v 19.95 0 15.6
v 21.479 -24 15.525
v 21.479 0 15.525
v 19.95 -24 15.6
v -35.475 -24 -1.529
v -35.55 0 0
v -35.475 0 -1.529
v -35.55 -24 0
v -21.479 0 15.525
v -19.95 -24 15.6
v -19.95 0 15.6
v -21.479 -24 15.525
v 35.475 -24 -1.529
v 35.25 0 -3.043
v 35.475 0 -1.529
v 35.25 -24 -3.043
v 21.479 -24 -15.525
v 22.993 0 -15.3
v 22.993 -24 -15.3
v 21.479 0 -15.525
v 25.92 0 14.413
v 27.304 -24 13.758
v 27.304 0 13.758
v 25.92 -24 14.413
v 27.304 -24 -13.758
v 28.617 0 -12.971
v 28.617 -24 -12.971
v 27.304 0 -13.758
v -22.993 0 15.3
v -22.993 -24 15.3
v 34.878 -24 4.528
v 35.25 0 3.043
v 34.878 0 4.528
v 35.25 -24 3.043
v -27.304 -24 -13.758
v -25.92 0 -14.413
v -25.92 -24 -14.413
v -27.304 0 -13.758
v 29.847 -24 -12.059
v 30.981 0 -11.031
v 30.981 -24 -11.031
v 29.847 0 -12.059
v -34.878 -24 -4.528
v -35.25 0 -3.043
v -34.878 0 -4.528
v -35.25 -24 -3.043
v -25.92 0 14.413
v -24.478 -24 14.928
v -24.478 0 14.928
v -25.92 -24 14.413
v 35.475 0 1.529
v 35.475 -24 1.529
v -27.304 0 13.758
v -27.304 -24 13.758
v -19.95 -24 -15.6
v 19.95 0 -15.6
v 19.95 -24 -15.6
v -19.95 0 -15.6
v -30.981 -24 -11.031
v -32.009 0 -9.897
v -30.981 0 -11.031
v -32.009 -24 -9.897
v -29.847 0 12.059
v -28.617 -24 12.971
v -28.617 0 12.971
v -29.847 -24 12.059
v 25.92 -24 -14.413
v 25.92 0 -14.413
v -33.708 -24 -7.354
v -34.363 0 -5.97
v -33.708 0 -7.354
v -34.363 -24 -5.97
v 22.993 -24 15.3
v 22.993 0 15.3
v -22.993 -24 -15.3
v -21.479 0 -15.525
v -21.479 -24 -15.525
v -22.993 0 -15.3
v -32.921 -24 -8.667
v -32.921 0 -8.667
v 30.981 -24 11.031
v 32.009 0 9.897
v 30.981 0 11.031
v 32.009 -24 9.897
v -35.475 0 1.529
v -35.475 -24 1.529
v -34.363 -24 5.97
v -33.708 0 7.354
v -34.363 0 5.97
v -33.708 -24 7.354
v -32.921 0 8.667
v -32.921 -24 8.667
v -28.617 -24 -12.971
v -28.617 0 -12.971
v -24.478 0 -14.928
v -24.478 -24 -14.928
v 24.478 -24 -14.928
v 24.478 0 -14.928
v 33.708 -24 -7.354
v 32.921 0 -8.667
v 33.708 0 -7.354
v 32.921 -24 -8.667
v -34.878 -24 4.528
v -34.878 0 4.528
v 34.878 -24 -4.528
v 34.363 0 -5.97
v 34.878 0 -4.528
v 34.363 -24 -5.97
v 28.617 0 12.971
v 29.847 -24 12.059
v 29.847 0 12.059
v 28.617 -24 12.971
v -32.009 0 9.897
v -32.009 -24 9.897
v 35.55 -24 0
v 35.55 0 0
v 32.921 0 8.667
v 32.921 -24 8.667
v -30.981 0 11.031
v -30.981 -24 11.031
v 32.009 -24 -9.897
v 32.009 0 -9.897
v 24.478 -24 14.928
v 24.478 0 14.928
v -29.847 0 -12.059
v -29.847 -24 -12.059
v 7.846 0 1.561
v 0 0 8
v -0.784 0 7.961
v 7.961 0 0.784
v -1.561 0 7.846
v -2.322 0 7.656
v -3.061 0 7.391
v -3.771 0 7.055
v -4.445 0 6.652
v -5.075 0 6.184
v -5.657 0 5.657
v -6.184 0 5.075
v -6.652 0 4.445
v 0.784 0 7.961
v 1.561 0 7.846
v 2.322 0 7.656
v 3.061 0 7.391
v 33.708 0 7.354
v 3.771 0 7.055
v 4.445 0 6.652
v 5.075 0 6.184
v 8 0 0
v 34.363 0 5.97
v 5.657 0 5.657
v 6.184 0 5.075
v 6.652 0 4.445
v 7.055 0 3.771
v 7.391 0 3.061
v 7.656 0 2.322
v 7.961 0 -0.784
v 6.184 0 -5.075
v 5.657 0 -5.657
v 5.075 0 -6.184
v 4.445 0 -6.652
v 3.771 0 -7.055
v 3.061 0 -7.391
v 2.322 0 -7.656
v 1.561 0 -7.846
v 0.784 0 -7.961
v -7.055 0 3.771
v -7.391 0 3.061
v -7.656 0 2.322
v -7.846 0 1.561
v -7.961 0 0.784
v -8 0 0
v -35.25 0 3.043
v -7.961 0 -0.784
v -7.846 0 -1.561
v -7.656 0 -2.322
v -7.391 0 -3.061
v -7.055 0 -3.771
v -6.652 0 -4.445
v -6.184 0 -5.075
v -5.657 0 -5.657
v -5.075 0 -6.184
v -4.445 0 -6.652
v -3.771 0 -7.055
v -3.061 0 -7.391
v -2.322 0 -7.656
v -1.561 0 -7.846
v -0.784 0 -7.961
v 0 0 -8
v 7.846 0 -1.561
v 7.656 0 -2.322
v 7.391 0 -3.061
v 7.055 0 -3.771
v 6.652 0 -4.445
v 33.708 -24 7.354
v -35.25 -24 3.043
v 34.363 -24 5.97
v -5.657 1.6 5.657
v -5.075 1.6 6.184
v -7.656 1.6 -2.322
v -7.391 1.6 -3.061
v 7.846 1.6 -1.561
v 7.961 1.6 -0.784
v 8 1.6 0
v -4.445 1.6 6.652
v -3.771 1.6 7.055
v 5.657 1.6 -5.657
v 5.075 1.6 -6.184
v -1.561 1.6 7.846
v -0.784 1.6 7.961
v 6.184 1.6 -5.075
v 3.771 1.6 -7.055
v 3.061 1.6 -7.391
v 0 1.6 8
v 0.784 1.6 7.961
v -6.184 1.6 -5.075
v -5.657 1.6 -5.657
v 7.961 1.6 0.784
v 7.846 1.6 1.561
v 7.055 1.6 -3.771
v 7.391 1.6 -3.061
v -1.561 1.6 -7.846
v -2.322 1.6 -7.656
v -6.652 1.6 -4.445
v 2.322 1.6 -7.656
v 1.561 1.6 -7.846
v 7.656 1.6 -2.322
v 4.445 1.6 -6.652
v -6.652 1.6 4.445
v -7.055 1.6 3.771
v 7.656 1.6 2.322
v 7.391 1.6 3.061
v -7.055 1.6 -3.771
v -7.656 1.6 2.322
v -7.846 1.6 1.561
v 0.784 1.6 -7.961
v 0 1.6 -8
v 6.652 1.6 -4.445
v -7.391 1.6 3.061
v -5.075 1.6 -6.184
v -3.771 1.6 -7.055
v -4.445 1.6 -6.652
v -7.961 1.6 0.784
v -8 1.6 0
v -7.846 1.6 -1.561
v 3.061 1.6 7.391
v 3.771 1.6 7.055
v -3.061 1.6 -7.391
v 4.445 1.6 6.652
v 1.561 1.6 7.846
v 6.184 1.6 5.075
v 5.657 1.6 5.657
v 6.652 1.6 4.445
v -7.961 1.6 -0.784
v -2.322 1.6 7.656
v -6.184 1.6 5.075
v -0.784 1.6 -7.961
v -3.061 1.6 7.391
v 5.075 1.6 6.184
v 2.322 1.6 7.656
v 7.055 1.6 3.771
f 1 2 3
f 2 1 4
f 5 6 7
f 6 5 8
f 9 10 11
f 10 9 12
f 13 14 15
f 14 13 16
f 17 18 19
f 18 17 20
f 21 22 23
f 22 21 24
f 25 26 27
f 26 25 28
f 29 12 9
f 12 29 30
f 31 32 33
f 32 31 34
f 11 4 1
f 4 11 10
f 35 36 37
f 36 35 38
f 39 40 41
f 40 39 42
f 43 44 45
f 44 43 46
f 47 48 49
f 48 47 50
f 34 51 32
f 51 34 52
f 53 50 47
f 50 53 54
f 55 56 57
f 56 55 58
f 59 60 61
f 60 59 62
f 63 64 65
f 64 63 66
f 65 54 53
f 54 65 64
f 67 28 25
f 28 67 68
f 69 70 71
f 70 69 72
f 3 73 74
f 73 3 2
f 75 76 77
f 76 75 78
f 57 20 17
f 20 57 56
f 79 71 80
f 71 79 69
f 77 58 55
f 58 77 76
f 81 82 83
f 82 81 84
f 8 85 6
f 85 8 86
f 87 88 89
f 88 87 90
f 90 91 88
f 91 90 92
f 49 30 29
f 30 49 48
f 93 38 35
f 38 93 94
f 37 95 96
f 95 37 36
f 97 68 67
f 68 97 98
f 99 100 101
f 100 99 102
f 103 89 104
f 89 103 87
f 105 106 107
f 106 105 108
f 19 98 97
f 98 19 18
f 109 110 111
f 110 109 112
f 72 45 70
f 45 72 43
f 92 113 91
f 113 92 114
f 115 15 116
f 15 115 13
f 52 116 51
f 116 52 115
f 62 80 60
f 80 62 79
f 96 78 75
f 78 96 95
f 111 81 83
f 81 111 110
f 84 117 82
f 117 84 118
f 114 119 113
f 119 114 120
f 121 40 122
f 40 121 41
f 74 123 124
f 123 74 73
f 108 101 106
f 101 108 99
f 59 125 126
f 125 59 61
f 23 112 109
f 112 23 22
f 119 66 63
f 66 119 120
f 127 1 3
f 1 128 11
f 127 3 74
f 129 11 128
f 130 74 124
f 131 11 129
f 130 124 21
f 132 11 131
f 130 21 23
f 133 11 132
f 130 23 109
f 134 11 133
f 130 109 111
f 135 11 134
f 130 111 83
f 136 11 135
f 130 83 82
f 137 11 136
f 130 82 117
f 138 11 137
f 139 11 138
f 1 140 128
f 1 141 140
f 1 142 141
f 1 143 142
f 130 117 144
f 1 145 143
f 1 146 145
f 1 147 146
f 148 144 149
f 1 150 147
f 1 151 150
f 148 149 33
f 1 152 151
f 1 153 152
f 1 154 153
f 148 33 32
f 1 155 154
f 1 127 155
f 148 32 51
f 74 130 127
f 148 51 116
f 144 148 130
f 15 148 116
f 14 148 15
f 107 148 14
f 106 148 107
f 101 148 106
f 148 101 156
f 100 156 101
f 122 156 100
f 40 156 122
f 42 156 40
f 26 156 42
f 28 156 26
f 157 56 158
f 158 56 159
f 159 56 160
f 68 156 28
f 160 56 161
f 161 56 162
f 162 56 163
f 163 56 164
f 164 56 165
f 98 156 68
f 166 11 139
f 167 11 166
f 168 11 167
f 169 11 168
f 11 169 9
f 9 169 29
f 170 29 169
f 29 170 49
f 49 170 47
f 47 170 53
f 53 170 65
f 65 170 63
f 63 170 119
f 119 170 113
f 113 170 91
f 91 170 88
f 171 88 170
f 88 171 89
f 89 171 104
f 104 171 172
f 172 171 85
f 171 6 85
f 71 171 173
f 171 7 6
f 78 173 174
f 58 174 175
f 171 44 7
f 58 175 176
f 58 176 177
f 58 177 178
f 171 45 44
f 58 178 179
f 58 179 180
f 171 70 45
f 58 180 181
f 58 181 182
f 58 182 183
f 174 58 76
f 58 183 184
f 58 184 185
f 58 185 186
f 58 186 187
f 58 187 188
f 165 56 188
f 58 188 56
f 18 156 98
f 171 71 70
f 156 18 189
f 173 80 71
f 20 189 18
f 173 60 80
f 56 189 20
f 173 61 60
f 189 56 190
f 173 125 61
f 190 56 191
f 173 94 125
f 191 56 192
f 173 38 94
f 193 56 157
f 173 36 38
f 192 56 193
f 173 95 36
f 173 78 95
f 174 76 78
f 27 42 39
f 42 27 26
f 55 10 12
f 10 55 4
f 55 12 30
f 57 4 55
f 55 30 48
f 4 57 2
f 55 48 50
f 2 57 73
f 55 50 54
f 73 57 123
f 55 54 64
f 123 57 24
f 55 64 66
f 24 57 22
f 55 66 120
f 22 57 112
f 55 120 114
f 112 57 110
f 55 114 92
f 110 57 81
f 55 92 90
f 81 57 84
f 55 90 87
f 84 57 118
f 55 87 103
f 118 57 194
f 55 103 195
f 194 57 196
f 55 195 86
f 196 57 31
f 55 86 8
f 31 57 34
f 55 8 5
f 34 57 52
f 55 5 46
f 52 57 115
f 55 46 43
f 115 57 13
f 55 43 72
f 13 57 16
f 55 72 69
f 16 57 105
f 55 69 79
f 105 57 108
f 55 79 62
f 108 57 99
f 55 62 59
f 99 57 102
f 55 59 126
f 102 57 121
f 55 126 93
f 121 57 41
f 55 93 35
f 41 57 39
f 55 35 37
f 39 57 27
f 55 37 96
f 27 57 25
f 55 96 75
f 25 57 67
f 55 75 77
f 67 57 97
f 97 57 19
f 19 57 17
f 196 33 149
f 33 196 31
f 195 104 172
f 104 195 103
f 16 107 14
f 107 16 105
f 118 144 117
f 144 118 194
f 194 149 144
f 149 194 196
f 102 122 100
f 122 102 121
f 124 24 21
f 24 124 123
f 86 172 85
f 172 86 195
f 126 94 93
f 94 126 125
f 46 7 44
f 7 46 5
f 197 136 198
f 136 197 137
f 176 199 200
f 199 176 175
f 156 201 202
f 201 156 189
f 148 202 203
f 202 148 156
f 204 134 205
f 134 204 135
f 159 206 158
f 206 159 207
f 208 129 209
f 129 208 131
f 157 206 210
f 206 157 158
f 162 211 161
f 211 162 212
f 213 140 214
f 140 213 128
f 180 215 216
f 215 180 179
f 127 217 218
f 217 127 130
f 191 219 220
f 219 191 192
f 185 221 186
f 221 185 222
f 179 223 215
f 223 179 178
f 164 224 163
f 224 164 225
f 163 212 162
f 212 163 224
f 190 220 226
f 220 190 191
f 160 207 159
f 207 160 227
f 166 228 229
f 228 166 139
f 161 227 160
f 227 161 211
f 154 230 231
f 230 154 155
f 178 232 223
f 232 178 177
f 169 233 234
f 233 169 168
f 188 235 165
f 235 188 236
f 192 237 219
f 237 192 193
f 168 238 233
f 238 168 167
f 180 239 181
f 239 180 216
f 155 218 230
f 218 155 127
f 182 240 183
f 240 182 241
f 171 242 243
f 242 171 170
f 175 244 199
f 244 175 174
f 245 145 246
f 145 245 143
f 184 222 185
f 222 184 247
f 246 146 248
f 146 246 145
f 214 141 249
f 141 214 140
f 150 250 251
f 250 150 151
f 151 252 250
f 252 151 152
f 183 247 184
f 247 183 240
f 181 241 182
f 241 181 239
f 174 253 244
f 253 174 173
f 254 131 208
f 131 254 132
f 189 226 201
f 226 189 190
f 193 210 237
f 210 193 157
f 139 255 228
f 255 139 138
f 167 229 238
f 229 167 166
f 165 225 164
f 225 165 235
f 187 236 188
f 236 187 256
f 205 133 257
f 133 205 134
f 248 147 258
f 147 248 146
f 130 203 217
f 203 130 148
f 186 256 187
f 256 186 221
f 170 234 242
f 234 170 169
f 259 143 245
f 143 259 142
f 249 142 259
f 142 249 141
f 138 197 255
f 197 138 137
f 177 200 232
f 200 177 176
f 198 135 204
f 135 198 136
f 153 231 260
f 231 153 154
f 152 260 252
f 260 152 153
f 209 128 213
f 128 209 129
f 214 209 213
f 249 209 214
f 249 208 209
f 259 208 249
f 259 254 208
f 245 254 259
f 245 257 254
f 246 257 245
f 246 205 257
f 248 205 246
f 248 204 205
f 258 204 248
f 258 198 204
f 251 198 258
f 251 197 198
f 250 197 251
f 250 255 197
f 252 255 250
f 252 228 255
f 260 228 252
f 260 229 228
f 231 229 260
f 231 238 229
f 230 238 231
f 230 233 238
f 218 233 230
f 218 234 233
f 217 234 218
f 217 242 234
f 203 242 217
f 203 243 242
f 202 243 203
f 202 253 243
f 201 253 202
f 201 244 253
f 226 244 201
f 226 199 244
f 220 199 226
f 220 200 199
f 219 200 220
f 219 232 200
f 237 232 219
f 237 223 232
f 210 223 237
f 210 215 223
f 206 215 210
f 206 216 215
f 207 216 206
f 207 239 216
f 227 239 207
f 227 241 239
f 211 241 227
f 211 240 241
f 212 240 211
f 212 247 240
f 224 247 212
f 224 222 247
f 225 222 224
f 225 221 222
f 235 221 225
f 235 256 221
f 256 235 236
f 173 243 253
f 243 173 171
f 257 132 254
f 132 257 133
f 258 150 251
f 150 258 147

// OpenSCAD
include <config.scad>

// ============================================================
// LOGITECH C310 BODY — NOT FOR PRINTING. Simplified visual mesh
// for the sim digital twin, so the cameras in MuJoCo / Isaac look
// like the real sensor. Pill-shaped housing + lens ring.
//
// PART FRAME: origin at the OPTICAL CENTER (lens), optical axis
// +Y, +Z up — the sim's camera sensors are colocated with this
// origin, so pose math stays trivial.
// ============================================================

module cam_body() {
    r = cam_body_h/2;
    // body center relative to the lens
    cx = -cam_lens_x_offset;
    cz = -cam_lens_z_offset;
    union() {
        // pill housing: hull of two depth-axis cylinders
        translate([cx, -cam_body_d, cz])
            hull()
                for (sx = [-1, 1])
                    translate([sx*(cam_body_w/2 - r), 0, 0])
                        rotate([-90, 0, 0])
                            cylinder(h=cam_body_d, r=r);
        // lens ring
        rotate([-90, 0, 0]) cylinder(h=1.6, d=cam_lens_ring_dia);
    }
}

cam_body();
